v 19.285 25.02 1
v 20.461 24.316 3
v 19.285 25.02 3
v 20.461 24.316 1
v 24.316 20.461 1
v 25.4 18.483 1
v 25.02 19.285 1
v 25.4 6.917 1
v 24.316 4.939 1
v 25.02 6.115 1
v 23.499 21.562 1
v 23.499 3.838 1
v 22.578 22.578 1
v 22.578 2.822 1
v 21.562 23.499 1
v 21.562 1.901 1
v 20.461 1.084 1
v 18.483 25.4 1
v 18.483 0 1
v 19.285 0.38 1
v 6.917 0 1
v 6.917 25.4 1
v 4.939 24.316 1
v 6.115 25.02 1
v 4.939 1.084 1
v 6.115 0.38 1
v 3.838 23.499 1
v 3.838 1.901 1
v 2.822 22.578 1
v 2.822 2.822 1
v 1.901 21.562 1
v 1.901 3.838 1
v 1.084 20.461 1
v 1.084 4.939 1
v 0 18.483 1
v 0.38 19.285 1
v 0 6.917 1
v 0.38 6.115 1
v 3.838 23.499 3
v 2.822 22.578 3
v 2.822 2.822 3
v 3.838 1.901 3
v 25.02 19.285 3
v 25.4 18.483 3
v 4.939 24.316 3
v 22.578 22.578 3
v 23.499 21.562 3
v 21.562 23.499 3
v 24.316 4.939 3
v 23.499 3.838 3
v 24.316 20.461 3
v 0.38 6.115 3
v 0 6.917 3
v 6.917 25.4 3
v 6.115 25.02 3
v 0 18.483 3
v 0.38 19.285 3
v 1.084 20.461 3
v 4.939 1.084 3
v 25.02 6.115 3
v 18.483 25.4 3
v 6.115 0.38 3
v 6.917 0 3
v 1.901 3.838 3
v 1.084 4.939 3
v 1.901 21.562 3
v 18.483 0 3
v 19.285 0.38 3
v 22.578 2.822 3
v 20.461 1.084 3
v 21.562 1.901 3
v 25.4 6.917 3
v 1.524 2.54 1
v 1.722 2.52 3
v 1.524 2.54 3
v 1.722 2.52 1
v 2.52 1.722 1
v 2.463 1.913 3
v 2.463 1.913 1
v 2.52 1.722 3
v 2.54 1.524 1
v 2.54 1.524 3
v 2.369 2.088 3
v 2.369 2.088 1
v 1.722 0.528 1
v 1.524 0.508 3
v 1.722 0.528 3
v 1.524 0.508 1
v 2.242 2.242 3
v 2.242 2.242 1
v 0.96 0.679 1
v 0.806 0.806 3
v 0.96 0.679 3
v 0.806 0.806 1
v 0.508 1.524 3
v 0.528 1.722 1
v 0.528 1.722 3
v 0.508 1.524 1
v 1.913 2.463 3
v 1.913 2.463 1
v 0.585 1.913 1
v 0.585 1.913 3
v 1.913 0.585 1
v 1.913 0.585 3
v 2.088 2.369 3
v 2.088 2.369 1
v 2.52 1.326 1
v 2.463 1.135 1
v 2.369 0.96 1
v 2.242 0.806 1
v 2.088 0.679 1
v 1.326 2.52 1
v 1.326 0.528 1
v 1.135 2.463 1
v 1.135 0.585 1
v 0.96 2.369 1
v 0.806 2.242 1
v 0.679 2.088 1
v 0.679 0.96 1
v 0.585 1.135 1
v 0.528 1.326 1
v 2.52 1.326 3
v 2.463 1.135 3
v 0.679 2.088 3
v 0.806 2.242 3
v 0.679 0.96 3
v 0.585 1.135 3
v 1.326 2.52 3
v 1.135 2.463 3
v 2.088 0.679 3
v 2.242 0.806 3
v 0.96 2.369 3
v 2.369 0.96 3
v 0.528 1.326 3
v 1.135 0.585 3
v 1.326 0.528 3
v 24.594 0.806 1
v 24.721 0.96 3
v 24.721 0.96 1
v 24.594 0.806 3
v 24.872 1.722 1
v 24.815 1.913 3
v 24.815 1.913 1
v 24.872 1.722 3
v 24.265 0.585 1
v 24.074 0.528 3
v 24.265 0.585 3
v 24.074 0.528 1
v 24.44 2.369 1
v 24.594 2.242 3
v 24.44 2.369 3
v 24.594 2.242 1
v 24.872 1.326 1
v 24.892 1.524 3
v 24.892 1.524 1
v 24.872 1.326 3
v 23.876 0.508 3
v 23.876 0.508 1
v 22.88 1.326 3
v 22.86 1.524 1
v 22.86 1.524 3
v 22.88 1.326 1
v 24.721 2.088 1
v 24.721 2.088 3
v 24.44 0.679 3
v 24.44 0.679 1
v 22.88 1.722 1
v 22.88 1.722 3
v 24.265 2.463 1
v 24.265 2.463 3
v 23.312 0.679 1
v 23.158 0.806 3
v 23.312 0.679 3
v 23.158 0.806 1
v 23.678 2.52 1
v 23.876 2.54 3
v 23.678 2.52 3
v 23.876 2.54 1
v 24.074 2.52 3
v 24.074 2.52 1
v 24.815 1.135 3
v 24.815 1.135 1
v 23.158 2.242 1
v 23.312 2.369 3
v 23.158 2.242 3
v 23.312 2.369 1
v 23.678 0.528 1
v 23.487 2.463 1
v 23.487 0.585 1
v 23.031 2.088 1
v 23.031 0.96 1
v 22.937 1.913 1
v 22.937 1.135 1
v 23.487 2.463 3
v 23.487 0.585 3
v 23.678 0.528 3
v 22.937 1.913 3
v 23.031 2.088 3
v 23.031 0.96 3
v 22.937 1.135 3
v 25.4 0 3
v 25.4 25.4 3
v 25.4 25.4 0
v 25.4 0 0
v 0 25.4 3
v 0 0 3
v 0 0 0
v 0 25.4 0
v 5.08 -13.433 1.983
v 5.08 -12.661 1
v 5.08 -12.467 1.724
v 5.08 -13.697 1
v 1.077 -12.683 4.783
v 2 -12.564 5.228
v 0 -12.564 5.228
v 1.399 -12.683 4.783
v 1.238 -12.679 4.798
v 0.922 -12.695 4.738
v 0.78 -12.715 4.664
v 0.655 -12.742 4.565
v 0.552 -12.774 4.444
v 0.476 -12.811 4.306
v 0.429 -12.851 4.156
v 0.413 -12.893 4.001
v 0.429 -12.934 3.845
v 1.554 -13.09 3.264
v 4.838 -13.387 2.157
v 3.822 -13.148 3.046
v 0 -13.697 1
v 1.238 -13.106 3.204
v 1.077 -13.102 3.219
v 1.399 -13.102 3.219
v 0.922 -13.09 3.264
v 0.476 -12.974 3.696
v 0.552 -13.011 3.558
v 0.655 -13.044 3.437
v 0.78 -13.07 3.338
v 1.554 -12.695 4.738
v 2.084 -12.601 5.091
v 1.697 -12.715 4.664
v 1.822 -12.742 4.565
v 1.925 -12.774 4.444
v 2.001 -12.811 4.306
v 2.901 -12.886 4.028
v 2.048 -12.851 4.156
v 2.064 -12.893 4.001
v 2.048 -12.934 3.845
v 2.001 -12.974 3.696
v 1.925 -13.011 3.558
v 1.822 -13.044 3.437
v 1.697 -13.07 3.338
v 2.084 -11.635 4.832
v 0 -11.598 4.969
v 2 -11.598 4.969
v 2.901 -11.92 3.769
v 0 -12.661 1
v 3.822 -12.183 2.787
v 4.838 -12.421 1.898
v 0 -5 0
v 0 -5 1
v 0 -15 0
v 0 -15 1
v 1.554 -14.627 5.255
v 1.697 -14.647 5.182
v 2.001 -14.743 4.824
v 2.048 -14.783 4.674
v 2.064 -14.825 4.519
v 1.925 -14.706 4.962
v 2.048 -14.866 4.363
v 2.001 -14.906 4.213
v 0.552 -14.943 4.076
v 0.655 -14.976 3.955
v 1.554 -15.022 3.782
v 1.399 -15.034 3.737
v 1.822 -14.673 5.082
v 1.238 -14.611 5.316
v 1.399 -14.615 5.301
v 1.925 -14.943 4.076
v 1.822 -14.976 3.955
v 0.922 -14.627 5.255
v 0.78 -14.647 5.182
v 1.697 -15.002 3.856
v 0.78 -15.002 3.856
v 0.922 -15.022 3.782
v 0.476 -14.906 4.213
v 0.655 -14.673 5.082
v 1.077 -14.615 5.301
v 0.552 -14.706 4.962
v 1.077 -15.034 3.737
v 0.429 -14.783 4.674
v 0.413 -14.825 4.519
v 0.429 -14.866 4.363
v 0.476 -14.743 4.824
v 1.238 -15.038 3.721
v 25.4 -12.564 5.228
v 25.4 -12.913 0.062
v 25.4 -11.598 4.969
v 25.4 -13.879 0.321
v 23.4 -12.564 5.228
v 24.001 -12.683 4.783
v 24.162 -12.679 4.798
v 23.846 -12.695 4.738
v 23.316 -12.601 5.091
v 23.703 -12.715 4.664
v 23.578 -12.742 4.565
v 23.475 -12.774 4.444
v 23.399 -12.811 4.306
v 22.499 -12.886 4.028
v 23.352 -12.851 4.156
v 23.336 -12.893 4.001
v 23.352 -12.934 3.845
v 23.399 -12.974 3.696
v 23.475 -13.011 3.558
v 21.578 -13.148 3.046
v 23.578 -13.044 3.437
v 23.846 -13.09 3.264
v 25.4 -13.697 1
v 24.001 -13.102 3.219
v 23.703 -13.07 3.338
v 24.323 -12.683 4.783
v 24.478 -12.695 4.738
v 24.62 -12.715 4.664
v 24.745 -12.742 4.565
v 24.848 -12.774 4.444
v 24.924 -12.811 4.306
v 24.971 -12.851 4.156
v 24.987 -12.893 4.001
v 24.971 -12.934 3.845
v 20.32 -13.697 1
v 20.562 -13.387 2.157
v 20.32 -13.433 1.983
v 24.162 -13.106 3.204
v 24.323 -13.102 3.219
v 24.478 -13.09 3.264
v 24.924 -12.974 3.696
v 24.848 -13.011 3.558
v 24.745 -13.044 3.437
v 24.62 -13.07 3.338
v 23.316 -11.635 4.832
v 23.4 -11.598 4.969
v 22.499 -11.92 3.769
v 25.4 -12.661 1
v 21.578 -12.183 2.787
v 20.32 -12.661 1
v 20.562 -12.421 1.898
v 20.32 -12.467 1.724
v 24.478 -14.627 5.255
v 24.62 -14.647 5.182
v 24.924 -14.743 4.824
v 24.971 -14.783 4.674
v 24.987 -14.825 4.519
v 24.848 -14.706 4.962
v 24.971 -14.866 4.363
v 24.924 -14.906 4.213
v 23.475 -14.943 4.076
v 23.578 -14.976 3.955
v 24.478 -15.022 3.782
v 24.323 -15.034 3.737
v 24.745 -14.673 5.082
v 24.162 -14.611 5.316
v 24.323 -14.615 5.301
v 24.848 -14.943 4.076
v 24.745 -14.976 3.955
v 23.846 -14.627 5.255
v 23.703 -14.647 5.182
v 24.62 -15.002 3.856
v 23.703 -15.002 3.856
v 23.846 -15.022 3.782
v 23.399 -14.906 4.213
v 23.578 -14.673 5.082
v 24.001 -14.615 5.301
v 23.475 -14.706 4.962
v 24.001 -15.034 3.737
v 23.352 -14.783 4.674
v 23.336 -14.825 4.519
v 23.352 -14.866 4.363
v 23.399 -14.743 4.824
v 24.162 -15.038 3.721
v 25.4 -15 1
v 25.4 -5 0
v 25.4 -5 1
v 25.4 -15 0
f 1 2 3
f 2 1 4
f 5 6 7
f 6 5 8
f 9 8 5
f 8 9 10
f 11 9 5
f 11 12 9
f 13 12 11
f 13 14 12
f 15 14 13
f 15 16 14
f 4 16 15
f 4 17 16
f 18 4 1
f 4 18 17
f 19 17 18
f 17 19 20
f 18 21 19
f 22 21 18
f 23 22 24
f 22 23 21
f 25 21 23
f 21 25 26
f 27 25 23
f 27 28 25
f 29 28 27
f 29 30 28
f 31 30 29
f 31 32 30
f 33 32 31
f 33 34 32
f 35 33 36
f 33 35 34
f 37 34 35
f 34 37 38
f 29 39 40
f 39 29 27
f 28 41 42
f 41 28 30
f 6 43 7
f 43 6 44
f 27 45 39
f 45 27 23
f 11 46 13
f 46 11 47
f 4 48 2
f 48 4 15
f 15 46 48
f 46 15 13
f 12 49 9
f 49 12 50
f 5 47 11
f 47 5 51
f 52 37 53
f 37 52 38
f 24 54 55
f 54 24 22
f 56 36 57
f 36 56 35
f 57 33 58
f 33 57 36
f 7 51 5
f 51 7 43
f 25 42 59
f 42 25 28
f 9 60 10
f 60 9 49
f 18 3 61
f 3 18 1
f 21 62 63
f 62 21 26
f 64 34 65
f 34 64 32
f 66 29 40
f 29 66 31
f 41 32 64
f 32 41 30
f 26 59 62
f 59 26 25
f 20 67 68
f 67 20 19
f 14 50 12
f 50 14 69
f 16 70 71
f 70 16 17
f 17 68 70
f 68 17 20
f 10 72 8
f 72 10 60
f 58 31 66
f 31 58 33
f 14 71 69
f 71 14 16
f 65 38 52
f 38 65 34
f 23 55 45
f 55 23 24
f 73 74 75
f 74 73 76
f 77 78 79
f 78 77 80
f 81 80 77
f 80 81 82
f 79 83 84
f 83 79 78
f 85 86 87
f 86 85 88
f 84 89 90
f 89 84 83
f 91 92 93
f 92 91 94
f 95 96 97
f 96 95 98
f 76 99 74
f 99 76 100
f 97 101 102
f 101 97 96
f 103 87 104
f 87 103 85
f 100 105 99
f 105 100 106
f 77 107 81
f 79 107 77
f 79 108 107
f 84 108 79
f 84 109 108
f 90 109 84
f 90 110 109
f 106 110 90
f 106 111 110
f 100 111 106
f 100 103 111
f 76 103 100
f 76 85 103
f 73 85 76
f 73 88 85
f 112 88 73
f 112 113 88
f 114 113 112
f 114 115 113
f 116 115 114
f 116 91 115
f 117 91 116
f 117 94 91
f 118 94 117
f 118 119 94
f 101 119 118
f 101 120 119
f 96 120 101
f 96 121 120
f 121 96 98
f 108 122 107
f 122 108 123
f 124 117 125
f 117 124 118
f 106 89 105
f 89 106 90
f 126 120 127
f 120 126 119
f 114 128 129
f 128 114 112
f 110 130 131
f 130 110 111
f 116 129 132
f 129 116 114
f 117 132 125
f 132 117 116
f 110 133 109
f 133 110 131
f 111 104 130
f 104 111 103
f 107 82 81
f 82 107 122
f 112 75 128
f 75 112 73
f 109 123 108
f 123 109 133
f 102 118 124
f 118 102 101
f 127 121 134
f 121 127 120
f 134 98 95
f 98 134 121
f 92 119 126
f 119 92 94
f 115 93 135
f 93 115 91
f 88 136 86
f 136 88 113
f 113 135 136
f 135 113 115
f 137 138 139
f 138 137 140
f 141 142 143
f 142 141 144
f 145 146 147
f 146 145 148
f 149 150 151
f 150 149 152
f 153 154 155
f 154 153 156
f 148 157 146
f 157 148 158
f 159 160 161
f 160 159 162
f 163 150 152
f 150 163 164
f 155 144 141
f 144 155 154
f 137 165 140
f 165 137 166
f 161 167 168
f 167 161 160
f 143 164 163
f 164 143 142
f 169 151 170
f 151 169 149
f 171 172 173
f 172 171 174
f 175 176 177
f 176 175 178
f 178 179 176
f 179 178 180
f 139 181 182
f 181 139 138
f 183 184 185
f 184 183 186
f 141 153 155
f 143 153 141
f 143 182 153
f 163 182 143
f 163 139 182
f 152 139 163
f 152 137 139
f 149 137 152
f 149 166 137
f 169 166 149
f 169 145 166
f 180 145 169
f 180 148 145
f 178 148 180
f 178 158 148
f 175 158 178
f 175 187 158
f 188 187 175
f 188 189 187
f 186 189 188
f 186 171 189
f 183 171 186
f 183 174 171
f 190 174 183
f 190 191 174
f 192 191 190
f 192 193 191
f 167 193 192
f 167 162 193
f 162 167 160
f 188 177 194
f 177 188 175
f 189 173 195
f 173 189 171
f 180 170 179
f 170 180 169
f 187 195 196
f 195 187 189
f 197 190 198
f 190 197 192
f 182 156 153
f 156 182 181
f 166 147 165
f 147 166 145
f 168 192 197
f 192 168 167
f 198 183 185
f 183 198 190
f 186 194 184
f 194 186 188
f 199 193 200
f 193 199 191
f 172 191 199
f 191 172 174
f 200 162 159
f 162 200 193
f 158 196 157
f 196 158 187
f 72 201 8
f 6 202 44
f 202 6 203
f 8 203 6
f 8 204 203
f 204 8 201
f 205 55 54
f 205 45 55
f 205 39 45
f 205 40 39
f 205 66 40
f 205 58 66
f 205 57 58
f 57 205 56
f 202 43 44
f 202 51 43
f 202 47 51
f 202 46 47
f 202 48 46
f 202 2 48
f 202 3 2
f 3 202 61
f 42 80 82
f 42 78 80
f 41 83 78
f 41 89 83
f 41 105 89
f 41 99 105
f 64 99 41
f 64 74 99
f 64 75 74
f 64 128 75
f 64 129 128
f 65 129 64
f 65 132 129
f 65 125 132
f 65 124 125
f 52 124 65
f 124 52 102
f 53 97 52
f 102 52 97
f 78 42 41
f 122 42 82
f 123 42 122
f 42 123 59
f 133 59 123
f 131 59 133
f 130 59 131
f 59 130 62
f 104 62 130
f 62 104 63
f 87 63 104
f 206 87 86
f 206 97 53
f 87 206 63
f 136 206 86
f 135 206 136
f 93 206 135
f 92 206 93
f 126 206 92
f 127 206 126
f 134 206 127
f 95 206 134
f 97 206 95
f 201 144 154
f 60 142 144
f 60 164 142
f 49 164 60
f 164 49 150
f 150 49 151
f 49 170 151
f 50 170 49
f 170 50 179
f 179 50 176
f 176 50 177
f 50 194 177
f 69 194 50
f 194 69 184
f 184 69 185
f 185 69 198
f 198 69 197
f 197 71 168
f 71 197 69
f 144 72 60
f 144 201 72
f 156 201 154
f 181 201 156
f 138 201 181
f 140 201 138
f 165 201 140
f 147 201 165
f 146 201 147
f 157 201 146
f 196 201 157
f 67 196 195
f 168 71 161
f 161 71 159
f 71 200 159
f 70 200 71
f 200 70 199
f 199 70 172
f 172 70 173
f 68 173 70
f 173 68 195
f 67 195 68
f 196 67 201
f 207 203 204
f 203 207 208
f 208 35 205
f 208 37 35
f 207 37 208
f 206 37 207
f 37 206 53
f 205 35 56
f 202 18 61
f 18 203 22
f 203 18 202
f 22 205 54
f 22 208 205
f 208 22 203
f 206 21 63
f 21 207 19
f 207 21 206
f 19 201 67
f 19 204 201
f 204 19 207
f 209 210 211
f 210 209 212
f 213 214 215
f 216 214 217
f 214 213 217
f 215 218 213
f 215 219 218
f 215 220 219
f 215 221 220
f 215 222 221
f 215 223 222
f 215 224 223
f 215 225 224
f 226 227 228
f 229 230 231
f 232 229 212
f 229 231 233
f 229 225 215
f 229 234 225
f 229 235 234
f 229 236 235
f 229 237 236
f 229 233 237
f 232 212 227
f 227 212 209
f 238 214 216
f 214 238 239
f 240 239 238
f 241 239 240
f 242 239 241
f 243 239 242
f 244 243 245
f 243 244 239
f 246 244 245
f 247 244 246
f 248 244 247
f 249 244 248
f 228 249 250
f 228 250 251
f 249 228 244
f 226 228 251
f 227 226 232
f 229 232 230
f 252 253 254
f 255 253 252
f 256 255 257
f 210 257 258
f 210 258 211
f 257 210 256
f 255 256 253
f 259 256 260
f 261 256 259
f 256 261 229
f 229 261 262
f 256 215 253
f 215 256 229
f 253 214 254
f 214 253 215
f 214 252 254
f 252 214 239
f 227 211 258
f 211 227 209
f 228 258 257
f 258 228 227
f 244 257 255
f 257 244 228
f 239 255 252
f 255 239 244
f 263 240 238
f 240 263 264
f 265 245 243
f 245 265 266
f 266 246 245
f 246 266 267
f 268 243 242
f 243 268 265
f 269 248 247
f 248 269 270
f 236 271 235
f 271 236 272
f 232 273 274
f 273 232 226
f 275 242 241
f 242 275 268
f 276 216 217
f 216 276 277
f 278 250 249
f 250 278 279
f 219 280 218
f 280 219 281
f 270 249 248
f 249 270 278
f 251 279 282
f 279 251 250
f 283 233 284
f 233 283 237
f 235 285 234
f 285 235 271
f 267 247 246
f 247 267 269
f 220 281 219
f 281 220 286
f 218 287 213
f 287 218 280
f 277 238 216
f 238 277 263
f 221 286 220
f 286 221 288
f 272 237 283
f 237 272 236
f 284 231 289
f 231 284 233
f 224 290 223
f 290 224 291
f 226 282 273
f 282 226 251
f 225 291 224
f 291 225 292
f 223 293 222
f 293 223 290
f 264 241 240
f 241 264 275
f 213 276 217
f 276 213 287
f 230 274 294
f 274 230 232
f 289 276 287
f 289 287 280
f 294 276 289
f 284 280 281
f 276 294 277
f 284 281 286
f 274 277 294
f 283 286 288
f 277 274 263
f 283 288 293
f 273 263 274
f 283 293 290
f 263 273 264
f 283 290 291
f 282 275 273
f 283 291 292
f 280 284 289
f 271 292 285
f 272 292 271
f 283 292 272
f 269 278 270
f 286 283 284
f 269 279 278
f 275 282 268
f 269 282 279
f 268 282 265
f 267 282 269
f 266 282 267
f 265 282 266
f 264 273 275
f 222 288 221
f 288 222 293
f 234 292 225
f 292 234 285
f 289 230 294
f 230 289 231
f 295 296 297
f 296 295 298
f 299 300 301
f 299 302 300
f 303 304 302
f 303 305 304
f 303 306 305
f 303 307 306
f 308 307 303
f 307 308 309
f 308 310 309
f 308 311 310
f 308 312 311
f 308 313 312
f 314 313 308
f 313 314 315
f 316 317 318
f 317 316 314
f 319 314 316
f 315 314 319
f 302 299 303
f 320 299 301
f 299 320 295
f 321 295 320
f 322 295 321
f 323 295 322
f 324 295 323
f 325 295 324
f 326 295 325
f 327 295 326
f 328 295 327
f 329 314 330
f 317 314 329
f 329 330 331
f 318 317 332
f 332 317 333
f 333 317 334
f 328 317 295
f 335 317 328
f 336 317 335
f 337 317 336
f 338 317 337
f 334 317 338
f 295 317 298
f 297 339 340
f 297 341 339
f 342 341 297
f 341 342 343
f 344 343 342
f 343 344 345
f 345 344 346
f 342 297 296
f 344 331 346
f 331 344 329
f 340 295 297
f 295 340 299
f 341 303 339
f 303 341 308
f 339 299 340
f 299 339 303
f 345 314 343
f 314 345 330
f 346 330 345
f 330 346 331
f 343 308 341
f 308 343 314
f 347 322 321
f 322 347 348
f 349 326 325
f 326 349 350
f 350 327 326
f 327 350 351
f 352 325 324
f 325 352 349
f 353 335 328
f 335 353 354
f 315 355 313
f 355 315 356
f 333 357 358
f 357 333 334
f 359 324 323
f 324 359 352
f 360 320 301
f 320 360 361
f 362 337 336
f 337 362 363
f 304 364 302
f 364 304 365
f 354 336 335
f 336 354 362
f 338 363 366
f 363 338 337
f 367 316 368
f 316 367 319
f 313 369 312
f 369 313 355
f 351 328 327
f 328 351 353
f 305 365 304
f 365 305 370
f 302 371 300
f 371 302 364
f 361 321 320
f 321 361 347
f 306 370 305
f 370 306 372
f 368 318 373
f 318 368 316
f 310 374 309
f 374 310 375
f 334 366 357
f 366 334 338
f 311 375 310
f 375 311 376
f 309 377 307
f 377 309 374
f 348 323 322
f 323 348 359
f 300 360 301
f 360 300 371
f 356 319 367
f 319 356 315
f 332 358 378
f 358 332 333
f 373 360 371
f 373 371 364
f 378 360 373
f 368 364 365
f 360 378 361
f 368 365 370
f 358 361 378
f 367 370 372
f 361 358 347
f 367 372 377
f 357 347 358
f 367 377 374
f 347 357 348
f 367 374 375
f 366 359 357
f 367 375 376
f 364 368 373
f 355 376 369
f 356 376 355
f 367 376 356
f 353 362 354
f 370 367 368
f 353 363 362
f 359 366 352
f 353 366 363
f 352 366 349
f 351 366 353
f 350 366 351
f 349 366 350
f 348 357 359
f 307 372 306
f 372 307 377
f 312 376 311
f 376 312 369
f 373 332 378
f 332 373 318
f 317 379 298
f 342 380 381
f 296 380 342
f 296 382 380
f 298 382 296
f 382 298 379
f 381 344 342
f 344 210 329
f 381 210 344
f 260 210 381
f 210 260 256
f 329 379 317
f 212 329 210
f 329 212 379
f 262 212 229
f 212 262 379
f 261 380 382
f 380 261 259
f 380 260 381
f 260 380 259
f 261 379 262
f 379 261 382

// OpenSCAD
// D&D Base w/Sign
// Created by Doug Kress
// First published on 2017-01-01.

// Use Wet erase markers to identify monsters in your battles.
/* [Options] */

// What would you like to create?
PrintOption = "both"; // [both:Both, base:Base Only, sign:SignOnly]

// select a size
BaseSize = 1;   // [0.75:Small, 1:Medium, 2:Large, 3:Huge, 4:Gargantuan, 6:Colossal]

// hight of sign (millimeters)
SignHeight = 10;

/* [Custom] */

// base size (in inches) - "Base Size" above will be ignored
Custom = 0;

printBase(PrintOption, Custom > 0 ? Custom : BaseSize);

module printBase(option, size) {
    if (option != "sign") {
        base(size * 25.4);
    }
    if (option != "base") {
        translate([0,-(SignHeight+5),0]) baseSign(size * 25.4);
    }
}

module base(baseSize)
{
    difference() {
        cube([baseSize, baseSize, 3]);
        union() {
        translate([baseSize/2, baseSize/2, 1])
            cylinder(r=baseSize/2*1.1 , h=3, $fn=64);
            
        offset = baseSize * 0.04;
        translate([offset*1.5, offset*1.5, 1])
            cylinder(r=offset, h=3, $fn=32);
        translate([baseSize-offset*1.5, offset*1.5, 1])
            cylinder(r=offset, h=3, $fn=32);
        }
    }
}


module signTab(baseSize, reverse)
{
    offset = baseSize * 0.0325;
    position = reverse ? baseSize * .2 - offset * 1.5 : offset * 1.5;
    cylPosition = reverse ? baseSize*.2 - baseSize/2-1 : baseSize/2+1;
    difference() {
        cube([baseSize*.2, baseSize*.2, 1]);
        translate([cylPosition,baseSize/2, -1])
            cylinder(r=baseSize/2*1.1 , h=3, $fn=64);
        
    }
    translate([position, baseSize*.15, 0])
        cylinder(r=offset, h=3, $fn=32);

}
module baseSign(baseSize)
{
    offset = baseSize * 0.035;
    cube([baseSize, SignHeight, 1]);
    rotate([75, 0, 0])  {
        translate([0,0.6,-2])
            signTab(baseSize, false);
        translate([baseSize-baseSize*.2,0.6,-2])
            signTab(baseSize, true);
   }         
}
